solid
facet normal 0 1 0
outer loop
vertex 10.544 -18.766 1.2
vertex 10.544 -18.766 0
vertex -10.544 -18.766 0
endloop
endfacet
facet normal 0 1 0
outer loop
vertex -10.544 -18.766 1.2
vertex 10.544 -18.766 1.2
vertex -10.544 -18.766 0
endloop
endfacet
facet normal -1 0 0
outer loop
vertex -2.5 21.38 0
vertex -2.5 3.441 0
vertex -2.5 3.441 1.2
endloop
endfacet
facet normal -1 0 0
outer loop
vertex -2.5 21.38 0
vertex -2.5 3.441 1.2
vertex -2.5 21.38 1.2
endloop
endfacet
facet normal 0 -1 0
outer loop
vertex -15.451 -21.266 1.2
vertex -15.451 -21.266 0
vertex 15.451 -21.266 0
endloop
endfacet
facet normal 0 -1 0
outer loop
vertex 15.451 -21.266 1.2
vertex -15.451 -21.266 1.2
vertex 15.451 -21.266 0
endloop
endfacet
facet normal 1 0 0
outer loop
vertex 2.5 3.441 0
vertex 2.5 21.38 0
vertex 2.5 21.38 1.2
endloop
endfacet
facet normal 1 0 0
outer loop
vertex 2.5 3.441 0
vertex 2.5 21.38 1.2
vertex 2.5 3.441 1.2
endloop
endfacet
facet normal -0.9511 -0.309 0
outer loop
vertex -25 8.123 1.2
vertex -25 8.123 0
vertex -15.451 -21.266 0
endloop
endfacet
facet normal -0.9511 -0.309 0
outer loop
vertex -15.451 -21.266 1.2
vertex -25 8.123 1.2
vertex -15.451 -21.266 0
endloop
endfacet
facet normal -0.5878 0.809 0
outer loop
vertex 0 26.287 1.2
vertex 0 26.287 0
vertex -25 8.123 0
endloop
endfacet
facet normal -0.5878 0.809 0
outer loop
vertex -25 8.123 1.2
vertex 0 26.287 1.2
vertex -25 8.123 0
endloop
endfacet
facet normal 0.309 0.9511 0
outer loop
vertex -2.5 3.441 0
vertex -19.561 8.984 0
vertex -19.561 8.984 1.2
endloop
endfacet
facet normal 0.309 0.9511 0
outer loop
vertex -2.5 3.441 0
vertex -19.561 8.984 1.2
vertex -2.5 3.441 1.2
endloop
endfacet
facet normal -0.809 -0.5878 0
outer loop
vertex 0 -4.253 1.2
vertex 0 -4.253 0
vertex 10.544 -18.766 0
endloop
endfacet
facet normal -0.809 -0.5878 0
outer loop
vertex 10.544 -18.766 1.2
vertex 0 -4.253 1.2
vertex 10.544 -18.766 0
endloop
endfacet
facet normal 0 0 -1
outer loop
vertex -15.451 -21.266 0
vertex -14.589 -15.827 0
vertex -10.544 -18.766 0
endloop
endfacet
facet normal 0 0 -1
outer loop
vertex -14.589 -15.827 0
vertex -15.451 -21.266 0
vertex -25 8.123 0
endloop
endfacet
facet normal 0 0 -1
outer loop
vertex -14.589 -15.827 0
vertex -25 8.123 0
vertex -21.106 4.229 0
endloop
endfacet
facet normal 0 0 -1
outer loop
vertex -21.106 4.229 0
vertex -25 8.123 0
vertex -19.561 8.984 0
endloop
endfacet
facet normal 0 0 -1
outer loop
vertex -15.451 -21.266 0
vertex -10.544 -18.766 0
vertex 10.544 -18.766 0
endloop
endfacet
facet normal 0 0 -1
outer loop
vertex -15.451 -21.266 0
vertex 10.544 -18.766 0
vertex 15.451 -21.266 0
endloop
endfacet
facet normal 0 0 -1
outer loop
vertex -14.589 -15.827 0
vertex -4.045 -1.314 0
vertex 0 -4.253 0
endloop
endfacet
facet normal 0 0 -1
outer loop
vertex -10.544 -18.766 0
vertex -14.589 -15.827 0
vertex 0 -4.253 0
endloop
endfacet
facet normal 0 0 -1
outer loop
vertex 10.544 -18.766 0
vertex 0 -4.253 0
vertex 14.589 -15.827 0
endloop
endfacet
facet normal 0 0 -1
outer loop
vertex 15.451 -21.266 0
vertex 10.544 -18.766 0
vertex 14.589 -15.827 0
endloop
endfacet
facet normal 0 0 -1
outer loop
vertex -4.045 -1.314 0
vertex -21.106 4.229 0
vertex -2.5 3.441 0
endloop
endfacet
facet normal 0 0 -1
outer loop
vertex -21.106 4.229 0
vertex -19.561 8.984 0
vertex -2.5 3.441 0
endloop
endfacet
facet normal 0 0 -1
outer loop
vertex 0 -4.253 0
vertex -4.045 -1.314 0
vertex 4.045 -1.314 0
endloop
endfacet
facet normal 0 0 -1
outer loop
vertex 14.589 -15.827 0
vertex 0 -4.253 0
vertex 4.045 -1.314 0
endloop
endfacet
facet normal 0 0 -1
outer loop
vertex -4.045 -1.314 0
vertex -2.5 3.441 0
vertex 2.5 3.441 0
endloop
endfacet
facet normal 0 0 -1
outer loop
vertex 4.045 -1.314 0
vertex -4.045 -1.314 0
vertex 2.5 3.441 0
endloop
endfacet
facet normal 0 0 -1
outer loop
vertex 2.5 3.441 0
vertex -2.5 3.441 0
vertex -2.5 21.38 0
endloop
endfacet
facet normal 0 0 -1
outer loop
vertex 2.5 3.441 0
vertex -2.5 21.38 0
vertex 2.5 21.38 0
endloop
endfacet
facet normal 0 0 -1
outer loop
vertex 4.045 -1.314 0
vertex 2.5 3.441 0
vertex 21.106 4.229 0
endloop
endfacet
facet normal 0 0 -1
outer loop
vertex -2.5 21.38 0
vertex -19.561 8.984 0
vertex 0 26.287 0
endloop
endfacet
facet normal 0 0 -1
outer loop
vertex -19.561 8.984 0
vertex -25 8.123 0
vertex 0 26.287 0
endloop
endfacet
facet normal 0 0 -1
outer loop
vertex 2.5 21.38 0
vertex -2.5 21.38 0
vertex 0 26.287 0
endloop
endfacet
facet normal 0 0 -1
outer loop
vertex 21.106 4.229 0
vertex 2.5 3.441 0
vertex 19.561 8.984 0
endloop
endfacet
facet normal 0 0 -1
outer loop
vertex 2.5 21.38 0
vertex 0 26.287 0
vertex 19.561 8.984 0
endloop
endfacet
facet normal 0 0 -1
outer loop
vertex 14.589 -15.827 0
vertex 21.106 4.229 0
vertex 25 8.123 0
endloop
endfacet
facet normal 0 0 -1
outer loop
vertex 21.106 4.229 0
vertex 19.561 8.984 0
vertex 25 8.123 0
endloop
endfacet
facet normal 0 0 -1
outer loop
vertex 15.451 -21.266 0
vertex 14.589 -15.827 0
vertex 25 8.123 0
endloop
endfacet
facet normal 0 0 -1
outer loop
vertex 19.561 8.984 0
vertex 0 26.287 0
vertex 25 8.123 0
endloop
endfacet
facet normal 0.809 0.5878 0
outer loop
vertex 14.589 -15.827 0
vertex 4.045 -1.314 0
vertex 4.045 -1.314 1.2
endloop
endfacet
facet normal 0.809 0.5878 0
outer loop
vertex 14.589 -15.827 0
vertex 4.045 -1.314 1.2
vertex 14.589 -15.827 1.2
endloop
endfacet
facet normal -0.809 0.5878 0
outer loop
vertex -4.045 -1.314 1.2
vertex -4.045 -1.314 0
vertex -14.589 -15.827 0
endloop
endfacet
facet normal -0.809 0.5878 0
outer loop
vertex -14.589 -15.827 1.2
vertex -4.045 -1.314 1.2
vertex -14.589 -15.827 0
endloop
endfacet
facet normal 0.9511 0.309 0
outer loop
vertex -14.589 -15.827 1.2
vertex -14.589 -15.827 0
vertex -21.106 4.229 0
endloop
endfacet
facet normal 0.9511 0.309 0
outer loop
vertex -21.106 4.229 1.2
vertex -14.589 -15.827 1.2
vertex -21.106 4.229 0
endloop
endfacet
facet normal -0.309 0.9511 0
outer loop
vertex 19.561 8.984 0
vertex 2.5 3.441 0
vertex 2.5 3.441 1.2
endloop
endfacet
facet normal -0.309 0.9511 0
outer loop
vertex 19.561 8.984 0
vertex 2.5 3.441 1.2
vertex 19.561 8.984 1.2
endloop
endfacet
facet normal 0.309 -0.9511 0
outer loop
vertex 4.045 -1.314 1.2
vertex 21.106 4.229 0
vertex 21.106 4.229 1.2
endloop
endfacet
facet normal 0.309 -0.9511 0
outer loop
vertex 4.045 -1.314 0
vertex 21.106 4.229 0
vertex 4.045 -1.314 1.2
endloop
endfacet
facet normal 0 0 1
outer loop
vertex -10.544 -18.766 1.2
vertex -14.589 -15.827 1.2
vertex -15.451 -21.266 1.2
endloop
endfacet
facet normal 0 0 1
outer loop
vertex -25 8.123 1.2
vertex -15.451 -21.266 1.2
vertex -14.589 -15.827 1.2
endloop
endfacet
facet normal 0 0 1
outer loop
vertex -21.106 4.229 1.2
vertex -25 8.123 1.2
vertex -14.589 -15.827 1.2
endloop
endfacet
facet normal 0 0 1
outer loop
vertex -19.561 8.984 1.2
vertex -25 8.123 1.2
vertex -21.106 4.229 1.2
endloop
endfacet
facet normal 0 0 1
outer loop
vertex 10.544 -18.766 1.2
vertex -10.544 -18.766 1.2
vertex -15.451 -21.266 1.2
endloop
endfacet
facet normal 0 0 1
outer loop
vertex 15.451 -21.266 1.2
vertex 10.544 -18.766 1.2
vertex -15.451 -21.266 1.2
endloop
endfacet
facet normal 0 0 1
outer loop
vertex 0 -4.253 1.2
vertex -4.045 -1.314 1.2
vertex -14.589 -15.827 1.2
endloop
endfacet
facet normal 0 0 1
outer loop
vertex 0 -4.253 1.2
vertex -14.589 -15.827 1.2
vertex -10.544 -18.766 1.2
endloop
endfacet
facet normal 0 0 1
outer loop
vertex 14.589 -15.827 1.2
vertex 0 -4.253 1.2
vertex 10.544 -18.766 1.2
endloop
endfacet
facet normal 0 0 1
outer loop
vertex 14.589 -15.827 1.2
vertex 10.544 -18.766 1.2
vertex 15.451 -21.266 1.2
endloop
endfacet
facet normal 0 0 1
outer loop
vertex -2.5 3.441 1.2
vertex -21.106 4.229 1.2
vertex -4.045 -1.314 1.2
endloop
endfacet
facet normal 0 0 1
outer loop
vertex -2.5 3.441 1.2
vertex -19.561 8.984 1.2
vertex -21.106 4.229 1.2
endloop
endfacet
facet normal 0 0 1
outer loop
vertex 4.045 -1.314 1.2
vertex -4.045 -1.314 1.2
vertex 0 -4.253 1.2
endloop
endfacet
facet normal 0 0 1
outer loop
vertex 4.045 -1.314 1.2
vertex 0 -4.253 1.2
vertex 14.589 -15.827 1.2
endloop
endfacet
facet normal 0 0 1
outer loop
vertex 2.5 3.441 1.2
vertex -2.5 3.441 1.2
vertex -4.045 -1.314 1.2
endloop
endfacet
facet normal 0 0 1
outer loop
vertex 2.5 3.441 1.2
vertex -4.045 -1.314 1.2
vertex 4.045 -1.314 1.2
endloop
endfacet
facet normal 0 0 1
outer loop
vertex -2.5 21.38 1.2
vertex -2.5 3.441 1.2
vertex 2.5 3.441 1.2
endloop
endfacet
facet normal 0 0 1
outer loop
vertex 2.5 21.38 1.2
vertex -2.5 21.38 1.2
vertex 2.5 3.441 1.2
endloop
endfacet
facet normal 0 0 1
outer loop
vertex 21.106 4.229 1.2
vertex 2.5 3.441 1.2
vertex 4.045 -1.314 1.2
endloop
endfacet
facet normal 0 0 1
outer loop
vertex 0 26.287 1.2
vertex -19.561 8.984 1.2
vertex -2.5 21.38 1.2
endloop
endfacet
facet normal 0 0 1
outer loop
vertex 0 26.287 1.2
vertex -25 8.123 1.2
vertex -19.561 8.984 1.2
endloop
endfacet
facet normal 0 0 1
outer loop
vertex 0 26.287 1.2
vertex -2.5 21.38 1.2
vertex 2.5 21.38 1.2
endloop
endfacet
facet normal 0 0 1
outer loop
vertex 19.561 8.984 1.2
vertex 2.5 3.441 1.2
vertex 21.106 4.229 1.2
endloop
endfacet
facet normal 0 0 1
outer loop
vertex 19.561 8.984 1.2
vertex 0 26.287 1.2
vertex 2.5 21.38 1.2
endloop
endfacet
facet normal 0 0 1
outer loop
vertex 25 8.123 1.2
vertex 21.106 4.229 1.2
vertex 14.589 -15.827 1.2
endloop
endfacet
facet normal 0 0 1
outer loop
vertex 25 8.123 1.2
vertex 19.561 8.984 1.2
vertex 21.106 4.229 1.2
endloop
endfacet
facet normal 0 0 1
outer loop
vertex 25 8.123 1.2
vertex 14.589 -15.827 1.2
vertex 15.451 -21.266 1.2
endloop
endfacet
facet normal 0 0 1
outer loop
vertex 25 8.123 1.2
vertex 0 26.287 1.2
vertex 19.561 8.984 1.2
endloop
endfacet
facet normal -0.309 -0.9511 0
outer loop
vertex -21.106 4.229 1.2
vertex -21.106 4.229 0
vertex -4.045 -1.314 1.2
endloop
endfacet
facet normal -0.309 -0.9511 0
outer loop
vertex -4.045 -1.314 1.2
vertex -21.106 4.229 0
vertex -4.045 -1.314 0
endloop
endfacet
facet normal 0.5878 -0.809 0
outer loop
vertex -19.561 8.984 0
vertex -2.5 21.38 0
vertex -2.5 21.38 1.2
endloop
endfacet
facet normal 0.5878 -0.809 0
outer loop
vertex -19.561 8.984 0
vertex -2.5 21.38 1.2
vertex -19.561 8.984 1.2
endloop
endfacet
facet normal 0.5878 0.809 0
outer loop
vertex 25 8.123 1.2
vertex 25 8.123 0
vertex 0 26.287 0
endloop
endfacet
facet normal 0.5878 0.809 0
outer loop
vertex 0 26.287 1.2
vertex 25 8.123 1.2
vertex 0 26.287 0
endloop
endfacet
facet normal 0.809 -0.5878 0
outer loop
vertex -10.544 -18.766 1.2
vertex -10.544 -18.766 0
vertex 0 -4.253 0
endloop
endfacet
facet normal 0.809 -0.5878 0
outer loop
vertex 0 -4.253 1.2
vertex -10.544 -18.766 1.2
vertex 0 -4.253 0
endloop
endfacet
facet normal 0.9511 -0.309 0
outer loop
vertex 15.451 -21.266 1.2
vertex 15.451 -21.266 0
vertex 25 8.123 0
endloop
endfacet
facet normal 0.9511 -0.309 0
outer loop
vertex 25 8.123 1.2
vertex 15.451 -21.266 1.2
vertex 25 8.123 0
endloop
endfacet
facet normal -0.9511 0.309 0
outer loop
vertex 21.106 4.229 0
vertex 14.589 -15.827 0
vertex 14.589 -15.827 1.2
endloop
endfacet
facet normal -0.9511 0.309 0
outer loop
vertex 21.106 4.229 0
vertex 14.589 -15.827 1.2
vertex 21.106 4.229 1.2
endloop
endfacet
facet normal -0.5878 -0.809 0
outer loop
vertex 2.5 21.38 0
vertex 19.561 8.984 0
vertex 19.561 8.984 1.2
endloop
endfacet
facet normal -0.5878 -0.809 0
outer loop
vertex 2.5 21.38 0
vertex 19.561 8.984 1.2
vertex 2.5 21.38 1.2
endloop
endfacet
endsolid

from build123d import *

# Parameters (mm, degrees)
BOSS_EXTRUDE1_DEPTH = 1.2


with BuildPart() as part:
    # Sketch1 → Boss-Extrude1 (new body)
    with BuildSketch(Plane.XY):
        Polygon((0, 26.286555606), (-25, 8.122992406), (-15.450849719, -21.266270209), (15.450849719, -21.266270209), (25, 8.122992406), align=None)
        Polygon((-21.10615871, 4.229151116), (-4.045084972, -1.31432778), (-14.589408427, -15.827343947), align=None, mode=Mode.SUBTRACT)
        Polygon((14.589408427, -15.827343947), (21.10615871, 4.229151116), (4.045084972, -1.31432778), align=None, mode=Mode.SUBTRACT)
        Polygon((-19.561073739, 8.984433698), (-2.5, 3.440954801), (-2.5, 21.380029342), align=None, mode=Mode.SUBTRACT)
        Polygon((2.5, 21.380029342), (2.5, 3.440954801), (19.561073739, 8.984433698), align=None, mode=Mode.SUBTRACT)
        Polygon((-10.544323455, -18.766270209), (0, -4.253254042), (10.544323455, -18.766270209), align=None, mode=Mode.SUBTRACT)
    extrude(amount=BOSS_EXTRUDE1_DEPTH)


solid = part.part
